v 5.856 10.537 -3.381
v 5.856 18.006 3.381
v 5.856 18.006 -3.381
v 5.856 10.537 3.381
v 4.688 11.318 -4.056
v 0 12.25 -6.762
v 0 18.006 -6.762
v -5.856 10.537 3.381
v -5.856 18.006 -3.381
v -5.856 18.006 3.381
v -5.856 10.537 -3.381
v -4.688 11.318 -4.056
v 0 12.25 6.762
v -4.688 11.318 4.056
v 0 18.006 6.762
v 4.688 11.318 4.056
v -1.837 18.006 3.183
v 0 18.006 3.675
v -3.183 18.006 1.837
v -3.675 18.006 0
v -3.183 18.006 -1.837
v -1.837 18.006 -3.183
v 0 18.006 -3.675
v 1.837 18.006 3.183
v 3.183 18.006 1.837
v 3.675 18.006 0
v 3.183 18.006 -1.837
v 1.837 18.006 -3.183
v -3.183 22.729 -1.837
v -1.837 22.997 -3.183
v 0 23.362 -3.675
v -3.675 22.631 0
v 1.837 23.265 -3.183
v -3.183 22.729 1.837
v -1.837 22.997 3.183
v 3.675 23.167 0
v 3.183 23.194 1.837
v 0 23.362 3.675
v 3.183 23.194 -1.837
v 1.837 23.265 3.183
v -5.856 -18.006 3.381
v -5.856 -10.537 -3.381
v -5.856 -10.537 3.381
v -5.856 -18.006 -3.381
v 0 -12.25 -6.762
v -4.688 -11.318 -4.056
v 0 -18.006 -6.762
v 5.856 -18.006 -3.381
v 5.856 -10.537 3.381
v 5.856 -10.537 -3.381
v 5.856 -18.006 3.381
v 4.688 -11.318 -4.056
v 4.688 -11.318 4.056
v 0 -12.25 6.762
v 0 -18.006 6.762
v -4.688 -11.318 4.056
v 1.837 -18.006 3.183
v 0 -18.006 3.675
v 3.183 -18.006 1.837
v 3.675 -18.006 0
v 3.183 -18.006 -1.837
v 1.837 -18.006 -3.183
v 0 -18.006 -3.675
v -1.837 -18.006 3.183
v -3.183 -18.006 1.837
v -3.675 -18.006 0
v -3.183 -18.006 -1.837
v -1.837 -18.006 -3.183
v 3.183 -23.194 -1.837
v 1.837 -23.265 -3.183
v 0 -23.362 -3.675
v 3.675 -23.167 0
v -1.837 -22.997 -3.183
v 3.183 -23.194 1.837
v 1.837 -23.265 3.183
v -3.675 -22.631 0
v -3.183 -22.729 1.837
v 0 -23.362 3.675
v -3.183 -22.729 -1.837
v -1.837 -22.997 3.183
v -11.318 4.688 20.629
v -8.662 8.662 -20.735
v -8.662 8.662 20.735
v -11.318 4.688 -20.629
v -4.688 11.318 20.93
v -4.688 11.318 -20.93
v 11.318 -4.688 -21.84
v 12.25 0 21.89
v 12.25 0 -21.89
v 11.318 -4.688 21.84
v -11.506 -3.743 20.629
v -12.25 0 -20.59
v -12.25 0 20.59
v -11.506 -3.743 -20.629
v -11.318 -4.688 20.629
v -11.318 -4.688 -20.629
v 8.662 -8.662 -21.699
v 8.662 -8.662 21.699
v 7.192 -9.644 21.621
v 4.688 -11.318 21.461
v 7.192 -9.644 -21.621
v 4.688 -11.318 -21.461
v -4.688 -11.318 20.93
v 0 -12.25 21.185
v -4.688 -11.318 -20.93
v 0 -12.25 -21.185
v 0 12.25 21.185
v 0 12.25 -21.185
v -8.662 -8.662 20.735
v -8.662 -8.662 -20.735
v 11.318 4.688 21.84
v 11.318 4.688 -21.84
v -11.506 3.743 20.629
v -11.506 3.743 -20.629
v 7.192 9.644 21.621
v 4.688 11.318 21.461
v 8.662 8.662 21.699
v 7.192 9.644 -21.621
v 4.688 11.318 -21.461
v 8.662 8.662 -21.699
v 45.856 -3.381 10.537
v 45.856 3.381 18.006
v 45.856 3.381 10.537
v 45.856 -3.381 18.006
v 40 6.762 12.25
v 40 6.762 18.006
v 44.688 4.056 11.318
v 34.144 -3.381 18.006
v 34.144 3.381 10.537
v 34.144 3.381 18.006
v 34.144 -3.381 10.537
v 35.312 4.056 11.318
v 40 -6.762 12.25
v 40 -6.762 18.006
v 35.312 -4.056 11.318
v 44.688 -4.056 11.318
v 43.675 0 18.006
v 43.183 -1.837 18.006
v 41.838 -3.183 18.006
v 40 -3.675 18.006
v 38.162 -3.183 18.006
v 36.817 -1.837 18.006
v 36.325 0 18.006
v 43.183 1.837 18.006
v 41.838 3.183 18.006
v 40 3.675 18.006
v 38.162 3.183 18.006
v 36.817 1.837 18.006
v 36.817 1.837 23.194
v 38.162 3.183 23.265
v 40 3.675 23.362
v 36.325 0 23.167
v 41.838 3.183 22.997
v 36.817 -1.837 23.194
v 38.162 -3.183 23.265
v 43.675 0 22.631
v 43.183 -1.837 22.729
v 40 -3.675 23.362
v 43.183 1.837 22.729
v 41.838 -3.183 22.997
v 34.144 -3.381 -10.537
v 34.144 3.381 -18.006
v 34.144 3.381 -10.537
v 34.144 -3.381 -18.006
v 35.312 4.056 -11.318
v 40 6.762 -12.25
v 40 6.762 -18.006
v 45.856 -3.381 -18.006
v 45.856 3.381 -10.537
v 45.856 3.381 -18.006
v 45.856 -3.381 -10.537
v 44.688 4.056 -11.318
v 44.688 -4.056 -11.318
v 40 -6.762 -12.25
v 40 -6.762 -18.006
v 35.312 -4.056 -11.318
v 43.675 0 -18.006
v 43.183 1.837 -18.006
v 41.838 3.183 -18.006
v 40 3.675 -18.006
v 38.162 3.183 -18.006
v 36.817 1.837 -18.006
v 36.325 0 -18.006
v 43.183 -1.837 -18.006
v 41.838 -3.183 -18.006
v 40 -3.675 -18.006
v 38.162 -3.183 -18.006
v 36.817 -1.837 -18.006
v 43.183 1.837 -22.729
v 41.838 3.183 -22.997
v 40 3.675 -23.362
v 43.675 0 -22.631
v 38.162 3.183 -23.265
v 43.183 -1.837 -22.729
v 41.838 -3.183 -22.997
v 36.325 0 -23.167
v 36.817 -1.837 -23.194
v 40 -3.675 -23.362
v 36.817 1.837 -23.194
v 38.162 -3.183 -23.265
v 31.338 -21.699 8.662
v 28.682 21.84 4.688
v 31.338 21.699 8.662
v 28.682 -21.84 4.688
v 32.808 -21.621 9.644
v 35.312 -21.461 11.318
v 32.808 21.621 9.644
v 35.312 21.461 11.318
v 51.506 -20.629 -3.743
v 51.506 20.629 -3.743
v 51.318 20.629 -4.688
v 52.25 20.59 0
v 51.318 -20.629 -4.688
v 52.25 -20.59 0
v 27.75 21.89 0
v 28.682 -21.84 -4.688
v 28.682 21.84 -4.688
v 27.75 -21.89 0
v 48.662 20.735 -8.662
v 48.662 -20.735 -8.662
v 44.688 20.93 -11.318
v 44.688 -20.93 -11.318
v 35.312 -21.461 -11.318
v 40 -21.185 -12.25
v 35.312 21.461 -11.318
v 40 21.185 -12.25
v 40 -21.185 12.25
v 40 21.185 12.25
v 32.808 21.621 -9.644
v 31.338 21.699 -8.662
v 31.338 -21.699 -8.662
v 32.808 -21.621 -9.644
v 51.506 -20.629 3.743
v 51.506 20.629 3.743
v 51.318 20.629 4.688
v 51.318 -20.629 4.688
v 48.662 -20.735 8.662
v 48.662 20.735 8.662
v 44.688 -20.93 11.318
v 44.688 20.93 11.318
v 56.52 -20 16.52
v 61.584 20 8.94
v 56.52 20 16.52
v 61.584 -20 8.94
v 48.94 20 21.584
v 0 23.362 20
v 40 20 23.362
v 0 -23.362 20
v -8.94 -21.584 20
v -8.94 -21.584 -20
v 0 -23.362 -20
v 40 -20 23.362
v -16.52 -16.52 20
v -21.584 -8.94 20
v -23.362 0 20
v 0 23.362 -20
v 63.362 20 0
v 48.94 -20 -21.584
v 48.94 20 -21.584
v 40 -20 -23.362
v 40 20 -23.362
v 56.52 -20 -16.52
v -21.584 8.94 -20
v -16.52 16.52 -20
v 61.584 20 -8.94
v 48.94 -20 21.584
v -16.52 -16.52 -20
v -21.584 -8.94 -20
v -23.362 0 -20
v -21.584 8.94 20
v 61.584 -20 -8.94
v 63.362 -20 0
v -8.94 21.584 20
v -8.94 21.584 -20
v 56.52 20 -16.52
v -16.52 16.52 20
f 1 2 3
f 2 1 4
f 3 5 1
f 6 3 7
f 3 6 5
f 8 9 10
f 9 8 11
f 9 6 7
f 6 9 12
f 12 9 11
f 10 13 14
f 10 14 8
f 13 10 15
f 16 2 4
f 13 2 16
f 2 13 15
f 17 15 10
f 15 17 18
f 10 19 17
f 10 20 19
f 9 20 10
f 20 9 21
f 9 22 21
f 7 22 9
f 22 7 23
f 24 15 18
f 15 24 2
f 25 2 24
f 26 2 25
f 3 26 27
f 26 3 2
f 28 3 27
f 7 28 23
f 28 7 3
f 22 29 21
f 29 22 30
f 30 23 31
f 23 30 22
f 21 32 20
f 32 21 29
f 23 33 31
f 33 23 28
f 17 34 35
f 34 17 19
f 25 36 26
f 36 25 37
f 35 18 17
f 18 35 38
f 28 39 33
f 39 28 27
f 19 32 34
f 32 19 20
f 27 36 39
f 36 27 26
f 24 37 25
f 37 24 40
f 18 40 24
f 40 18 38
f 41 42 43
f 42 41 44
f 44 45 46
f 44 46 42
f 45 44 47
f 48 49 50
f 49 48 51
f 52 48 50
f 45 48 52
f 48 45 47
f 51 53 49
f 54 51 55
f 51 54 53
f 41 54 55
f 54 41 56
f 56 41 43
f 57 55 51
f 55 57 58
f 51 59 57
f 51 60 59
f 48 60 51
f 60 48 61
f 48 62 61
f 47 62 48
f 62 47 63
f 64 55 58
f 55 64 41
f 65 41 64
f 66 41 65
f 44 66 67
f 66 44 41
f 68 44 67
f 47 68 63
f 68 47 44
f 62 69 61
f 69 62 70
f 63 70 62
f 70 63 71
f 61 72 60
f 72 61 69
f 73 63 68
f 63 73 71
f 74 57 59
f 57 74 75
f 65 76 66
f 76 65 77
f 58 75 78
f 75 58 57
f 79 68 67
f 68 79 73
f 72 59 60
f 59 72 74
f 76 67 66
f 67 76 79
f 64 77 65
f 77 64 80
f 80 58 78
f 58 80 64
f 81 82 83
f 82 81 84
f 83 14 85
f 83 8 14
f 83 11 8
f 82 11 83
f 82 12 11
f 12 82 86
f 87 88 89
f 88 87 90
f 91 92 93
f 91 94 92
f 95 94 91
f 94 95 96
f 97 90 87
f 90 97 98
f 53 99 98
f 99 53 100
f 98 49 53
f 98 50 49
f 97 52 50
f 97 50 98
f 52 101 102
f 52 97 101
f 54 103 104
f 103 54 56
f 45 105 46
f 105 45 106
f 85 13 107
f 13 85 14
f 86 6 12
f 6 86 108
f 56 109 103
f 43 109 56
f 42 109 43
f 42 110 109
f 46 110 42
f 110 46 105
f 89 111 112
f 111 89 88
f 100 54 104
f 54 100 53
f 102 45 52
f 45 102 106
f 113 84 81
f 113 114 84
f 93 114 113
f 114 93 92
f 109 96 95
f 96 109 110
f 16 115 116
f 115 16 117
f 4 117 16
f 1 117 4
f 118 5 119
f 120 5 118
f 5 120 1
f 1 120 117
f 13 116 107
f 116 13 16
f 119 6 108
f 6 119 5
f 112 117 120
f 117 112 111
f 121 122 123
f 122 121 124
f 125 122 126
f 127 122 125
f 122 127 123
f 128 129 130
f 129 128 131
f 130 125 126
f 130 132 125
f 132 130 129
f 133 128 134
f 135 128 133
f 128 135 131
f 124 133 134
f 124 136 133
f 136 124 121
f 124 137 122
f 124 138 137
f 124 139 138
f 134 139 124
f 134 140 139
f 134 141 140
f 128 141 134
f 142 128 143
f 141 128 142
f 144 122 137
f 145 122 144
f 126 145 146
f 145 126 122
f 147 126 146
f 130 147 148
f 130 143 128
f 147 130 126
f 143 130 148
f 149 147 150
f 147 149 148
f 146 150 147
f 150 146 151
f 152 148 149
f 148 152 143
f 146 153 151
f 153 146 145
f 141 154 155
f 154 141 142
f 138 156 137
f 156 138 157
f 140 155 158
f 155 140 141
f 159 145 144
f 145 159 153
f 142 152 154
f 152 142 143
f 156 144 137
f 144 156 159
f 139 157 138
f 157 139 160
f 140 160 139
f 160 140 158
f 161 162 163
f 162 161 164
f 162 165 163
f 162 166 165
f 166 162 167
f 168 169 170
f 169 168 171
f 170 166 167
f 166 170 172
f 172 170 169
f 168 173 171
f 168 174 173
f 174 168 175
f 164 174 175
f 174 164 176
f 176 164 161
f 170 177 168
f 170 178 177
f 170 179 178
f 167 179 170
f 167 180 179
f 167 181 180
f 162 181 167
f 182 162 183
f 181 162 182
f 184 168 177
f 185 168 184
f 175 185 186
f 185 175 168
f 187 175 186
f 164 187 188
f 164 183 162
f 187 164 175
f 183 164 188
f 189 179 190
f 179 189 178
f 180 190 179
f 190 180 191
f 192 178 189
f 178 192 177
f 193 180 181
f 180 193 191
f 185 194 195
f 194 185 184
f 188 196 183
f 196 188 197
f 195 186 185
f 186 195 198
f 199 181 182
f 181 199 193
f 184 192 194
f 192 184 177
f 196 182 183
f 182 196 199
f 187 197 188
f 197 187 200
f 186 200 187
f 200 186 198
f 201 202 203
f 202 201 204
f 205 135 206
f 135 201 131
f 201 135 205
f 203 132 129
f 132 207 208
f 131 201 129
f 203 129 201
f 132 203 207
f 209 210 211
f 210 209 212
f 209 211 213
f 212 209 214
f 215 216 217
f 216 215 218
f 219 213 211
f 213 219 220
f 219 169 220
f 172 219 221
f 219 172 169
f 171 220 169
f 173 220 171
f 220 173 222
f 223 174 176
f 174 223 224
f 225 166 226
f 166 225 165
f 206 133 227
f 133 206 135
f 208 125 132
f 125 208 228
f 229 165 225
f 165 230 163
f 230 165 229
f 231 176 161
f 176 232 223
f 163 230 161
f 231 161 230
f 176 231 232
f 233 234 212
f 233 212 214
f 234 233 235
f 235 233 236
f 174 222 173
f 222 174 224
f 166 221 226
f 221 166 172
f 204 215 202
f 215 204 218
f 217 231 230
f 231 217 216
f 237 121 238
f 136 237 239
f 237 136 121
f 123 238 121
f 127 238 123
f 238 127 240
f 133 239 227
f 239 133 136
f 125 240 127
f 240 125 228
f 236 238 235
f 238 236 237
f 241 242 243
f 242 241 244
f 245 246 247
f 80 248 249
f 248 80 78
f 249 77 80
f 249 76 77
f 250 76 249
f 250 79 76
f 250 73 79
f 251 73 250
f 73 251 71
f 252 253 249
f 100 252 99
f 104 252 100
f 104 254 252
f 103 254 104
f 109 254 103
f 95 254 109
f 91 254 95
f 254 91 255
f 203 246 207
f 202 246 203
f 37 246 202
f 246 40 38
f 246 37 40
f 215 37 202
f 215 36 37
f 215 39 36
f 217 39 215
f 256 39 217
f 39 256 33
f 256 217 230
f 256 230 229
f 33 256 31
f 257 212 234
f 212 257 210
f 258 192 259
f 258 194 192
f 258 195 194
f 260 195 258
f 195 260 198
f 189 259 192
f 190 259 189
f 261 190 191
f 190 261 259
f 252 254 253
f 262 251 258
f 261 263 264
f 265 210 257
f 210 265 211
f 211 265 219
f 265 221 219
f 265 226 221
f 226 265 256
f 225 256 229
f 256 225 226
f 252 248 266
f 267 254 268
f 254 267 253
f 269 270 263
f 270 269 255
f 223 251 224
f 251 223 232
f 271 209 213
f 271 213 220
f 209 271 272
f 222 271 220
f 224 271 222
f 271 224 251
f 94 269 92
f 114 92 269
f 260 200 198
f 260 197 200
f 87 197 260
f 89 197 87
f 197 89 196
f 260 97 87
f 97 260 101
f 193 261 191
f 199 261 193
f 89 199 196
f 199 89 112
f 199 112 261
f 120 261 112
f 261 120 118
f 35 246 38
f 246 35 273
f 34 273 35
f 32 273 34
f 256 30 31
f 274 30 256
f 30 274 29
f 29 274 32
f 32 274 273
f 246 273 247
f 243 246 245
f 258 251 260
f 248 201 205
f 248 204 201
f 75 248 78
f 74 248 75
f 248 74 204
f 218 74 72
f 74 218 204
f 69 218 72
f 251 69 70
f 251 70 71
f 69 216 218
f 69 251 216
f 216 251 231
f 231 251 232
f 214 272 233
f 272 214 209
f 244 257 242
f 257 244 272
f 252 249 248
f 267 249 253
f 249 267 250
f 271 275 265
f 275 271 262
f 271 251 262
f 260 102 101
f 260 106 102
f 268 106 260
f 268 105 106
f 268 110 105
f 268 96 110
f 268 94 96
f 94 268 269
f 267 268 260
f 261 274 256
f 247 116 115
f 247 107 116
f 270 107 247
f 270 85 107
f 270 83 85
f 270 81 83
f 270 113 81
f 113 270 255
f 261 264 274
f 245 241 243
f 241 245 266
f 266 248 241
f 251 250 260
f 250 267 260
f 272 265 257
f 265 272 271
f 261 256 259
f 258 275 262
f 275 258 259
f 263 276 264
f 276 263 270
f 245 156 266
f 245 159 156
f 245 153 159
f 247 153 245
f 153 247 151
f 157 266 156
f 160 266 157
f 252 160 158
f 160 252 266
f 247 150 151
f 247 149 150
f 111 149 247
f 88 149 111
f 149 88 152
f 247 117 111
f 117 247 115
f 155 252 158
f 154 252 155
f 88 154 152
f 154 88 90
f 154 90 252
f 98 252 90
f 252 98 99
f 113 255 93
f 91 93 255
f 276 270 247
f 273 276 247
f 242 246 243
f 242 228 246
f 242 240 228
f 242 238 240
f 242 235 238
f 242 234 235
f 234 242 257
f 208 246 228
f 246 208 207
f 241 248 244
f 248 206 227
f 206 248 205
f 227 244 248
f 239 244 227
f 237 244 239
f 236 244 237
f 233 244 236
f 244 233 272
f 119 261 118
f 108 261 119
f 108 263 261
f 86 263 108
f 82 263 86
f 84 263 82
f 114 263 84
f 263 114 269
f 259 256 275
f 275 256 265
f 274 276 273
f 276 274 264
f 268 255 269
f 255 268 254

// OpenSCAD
// file: hueco_baqueta.scad
use <tuercas_metricas.scad>;
use <tuerca_UNC-UNF.scad>;
use <tuerca_whitworth.scad>;

/* ============================================================
   PARÁMETROS GENERALES
   ============================================================ */

hueco_principal        = true;
diametro               = 24;     // diámetro de la baqueta/eje (mm)
poly_n                 = 16;
margen                 = .5;
largo_hueco_principal  = 120;
angulo_tornillo        = 0;      // ángulo de arranque del primer tornillo (grados)

// --- 1) Elegí la FAMILIA de rosca/tuerca ---
// "UNC" | "UNF" | "metrica" | "whitworth"
familia_tuerca  = "UNC";

// --- Elegí el SUBTIPO (vocabulario unificado) ---
// "normal" | "delgada" | "autoblocante" | "brida"
// (para UNC/UNF esto se traduce internamente a "jam"/"nylon")
subtipo_tuerca  = "normal";

// Medida del tornillo/rosca:
//   - "metrica"            -> milímetros (ej: 8 para M8)
//   - "UNC" / "UNF" / "whitworth" -> pulgadas decimales (ej: 0.25 = 1/4")
medida_tornillo    = 0.25;
profundidad_pieza  = 12;

// --- 2) Elegí cuántos tornillos (se distribuyen equiespaciados) ---
cantidad_tornillos = 1;      // 1, 2, 3, 4, 6, lo que necesites

ancho_baqueta = 30;           // largo del cilindro macizo (eje Y de la pieza)

d = diametro + margen;
r = d / 2;

/* ============================================================
   NORMALIZACIÓN DE SUBTIPOS ENTRE FAMILIAS
   UNC/UNF usan "jam"/"nylon", metrica/whitworth usan
   "delgada"/"autoblocante". Acá se traduce automáticamente.
   ============================================================ */

function subtipo_interno(familia, subtipo) =
    (familia == "UNC" || familia == "UNF") ?
        (subtipo == "delgada"      ? "jam"   :
         subtipo == "autoblocante" ? "nylon" :
         subtipo) : // "normal" y "brida" ya coinciden
    subtipo; // metrica y whitworth usan el vocabulario tal cual

/* ============================================================
   FUNCIONES AUX: ancho de llave según familia/subtipo/medida
   ============================================================ */

function ancho_tuerca(familia, subtipo, medida) =
    (familia == "UNC" || familia == "UNF") ? tuerca_unc(medida, subtipo_interno(familia, subtipo))[0] :
    (familia == "metrica")                 ? tuerca_metrica(medida, subtipo)[0] :
    (familia == "whitworth")                ? tuerca_whitworth(medida, subtipo)[0] :
    0;

// Grosor de material necesario para alojar la tuerca elegida:
// diámetro del eje (+margen) + 2 veces el ancho de llave de la tuerca.
// Es la misma cuenta que usabas a mano:
//   grosor = d + tuerca_unc(0.25,"normal")[0] * 2;
// Ahora con DEFAULTS: podés llamarla sin argumentos y toma los
// valores globales de arriba, o pisar solo los que necesites:
//   grosor_baqueta()                              -> usa todos los defaults
//   grosor_baqueta(medida = 8, familia = "metrica") -> pisa solo esos dos
function grosor_baqueta(
    diametro = diametro,
    margen   = margen,
    familia  = familia_tuerca,
    subtipo  = subtipo_tuerca,
    medida   = medida_tornillo
) = (diametro + margen) + ancho_tuerca(familia, subtipo, medida) * 2;

c = ancho_tuerca(familia_tuerca, subtipo_tuerca, medida_tornillo);
sagita = r - sqrt(pow(r, 2) - pow(c / 2, 2)) + margen;

echo(str("Tuerca elegida: ", familia_tuerca, " / ", subtipo_tuerca, " ", medida_tornillo, " -> ancho llave: ", c));

/* ============================================================
   DISTRIBUCIÓN RADIAL CON children()
   Reparte "cantidad" copias de lo que le pases como hijo,
   girando alrededor del eje X, a distancia "radio", empezando
   en "angulo_offset".
   ============================================================ */

module distribuir_radial(cantidad, radio, angulo_offset = 0) {
    paso = 360 / cantidad;
    for (i = [0 : cantidad - 1]) {
        rotate([angulo_offset + i * paso, 0, 0])
            translate([0, 0, radio])
                children();
    }
}

/* ============================================================
   SELECTOR DE AGUJERO+TUERCA SEGÚN FAMILIA
   Acá se conecta cada librería real con su nombre correcto.
   ============================================================ */

module agujero_tuerca(familia, subtipo, medida, profundidad_pieza, alivio) {
    if (familia == "UNC" || familia == "UNF") {
        agujero_con_tuerca_unc(
            medida,
            profundidad_pieza = profundidad_pieza,
            tipo   = subtipo_interno(familia, subtipo),
            serie  = familia,
            alivio = alivio
        );
    } else if (familia == "metrica") {
        agujero_con_tuerca_metrica(
            medida,
            tipo = subtipo,
            profundidad_pieza = profundidad_pieza,
            alivio = alivio
        );
    } else if (familia == "whitworth") {
        agujero_con_tuerca_whitworth(
            medida,
            profundidad_pieza = profundidad_pieza,
            tipo = subtipo,
            alivio = alivio
        );
    } else {
        echo(str("ATENCION: familia_tuerca desconocida: ", familia));
    }
}

/* ============================================================
   MÓDULO PRINCIPAL (el hueco / agujeros a restar)
   ============================================================ */

module hueco_baqueta(
    diametro              = diametro,
    margen                = margen,
    largo_hueco_principal = largo_hueco_principal,
    poly_n                = poly_n,
    familia_tuerca        = familia_tuerca,
    subtipo_tuerca        = subtipo_tuerca,
    medida_tornillo       = medida_tornillo,
    cantidad_tornillos    = cantidad_tornillos,
    profundidad_pieza     = profundidad_pieza,
    angulo_tornillo       = angulo_tornillo,
    hueco_principal       = hueco_principal
) {
    d_ = diametro + margen;
    r_ = d_ / 2;
    c_ = ancho_tuerca(familia_tuerca, subtipo_tuerca, medida_tornillo);
    sagita_ = r_ - sqrt(pow(r_, 2) - pow(c_ / 2, 2)) + margen;

    if (hueco_principal) {
        rotate([0, 90, 0])
            cylinder(d = d_, h = largo_hueco_principal, center = true, $fn = poly_n);
    }

    distribuir_radial(cantidad_tornillos, r_, angulo_tornillo)
        agujero_tuerca(familia_tuerca, subtipo_tuerca, medida_tornillo, profundidad_pieza, sagita_);
}

/* ============================================================
   PIEZA MACIZA (cilindro exterior ya con grosor calculado)
   ============================================================ */

module baqueta_solida(
    diametro              = diametro,
    margen                = margen,
    familia_tuerca        = familia_tuerca,
    subtipo_tuerca        = subtipo_tuerca,
    medida_tornillo       = medida_tornillo,
    ancho_baqueta         = ancho_baqueta,
    poly_n                = poly_n
) {
    g = grosor_baqueta(diametro, margen, familia_tuerca, subtipo_tuerca, medida_tornillo);
    rotate([0, 90, 0])
        cylinder(d = g, h = ancho_baqueta, center = true, $fn = poly_n);
}

/* ============================================================
   USO
   ============================================================ */

difference() {
    baqueta_solida();
    hueco_baqueta();
}

// --- Ejemplos de otras combinaciones, solo cambiando parámetros ---
// difference() {
//     baqueta_solida(familia_tuerca = "metrica", subtipo_tuerca = "autoblocante", medida_tornillo = 6);
//     hueco_baqueta(cantidad_tornillos = 6, familia_tuerca = "metrica", subtipo_tuerca = "autoblocante", medida_tornillo = 6);
// }

// grosor_baqueta() con distintos overrides:
// echo(grosor_baqueta());                                 // todo por defecto
// echo(grosor_baqueta(medida = 8, familia = "metrica"));   // pisa solo medida y familia
// main file
use <hueco_baqueta.scad>;





 poly_n = 12;
 diametro = 7;
 radio= diametro/2;
 altura =18;
 distancia=40;
 ancho_baqueta=40;
 rotacion=120;
 cantidad=5;
 
 
difference() {
 
 hull(){
    rotate([0,90,90])baqueta_solida(ancho_baqueta=ancho_baqueta);
translate([distancia, 0,0])rotate([0,0,90])
    baqueta_solida(ancho_baqueta=ancho_baqueta);
}

  rotate([0,90,90]) hueco_baqueta(cantidad_tornillos=2);;
translate([distancia, 0,0])rotate([0,0,90])
     hueco_baqueta(cantidad_tornillos=2);
    }
 
 //array
// difference() {
//  hull(){
// for (i =[0:cantidad]){translate([distancia*i, 0,0])rotate([0,0,90])
//    baqueta_solida(ancho_baqueta=ancho_baqueta);
//}}
//
// for (i =[0:cantidad]){translate([distancia*i, 0,0])rotate([0,0,90])
// hueco_baqueta(cantidad_tornillos=2);}}
 
 
 
 //angulo variable
//difference() {
// 
// hull(){
//    rotate([0,0,90])baqueta_solida(ancho_baqueta=ancho_baqueta);
//translate([distancia, 0,0])rotate([0,rotacion,90])
//    baqueta_solida(ancho_baqueta=ancho_baqueta);
//}
//
//  rotate([0,0,90]) hueco_baqueta(cantidad_tornillos=2);;
//translate([distancia, 0,0])rotate([0,rotacion,90])
//     hueco_baqueta(cantidad_tornillos=2);
//    }
//    
    
    // a 90 grados
//difference() {
// 
// hull(){
//    rotate([0,90,90])baqueta_solida(ancho_baqueta=ancho_baqueta);
//translate([distancia, 0,0])rotate([0,0,90])
//    baqueta_solida(ancho_baqueta=ancho_baqueta);
//}
//
//  rotate([0,90,90]) hueco_baqueta(cantidad_tornillos=2);;
//translate([distancia, 0,0])rotate([0,0,90])
//     hueco_baqueta(cantidad_tornillos=2);
//    }




//cruz
//
// hull(){
//    rotate([0,90,90])baqueta_solida(ancho_baqueta=60);
//translate([0, 0, 0.0])rotate([0,0,90])
//    baqueta_solida(ancho_baqueta=60);
//}


// difference() {
//
// hull(){
//    baqueta_solida(ancho_baqueta=60);
//translate([diametro, 0, 0.0])rotate([0,90,90])
//    baqueta_solida(ancho_baqueta=60);
//}
//     hueco_baqueta(cantidad_tornillos=2);
//
// translate([diametro, 0, 0.0])rotate([0,90,90])
//    hueco_baqueta(cantidad_tornillos=2);
// }

 //color("#aa0000")cylinder(h = altura, d=diametro, center = true, $fn=poly_n);
 // translate([0, 10, 0.0])
////hull(){
////cylinder(h = altura, d=diametro, center = true, $fn=poly_n); 
////translate([diametro, 0, 0.0])rotate([0,90,90])
////cylinder(h = altura, d=diametro, center = true, $fn=poly_n); 
////}
  
  
  
 
 //T
// hull(){
//cylinder(h = altura, d=diametro, center = true, $fn=poly_n); 
//translate([diametro, 0, 0.0])rotate([0,90,0])
//cylinder(h = altura, d=diametro, center = true, $fn=poly_n); 
//}
  
 
//difference(){
//hull(){
//  cylinder(h = altura, d=diametro, center = true, $fn=poly_n); 
//  translate([radio, 0, 0.0])
//  cube([2,2,altura],center = true);
// }
//    cylinder(h = altura, d=diametro*.5, center = true, $fn=poly_n);
//}
//
//translate([10+radio+1, 0, 0.0]){
// difference(){
//hull(){
//   cylinder(h = altura, d=diametro, center = true, $fn=poly_n);
//  translate([-radio, 0, 0.0])
//  cube([2,2,altura],center = true);
// }
//   cylinder(h = altura, d=diametro*.5, center = true, $fn=poly_n);
//}}
